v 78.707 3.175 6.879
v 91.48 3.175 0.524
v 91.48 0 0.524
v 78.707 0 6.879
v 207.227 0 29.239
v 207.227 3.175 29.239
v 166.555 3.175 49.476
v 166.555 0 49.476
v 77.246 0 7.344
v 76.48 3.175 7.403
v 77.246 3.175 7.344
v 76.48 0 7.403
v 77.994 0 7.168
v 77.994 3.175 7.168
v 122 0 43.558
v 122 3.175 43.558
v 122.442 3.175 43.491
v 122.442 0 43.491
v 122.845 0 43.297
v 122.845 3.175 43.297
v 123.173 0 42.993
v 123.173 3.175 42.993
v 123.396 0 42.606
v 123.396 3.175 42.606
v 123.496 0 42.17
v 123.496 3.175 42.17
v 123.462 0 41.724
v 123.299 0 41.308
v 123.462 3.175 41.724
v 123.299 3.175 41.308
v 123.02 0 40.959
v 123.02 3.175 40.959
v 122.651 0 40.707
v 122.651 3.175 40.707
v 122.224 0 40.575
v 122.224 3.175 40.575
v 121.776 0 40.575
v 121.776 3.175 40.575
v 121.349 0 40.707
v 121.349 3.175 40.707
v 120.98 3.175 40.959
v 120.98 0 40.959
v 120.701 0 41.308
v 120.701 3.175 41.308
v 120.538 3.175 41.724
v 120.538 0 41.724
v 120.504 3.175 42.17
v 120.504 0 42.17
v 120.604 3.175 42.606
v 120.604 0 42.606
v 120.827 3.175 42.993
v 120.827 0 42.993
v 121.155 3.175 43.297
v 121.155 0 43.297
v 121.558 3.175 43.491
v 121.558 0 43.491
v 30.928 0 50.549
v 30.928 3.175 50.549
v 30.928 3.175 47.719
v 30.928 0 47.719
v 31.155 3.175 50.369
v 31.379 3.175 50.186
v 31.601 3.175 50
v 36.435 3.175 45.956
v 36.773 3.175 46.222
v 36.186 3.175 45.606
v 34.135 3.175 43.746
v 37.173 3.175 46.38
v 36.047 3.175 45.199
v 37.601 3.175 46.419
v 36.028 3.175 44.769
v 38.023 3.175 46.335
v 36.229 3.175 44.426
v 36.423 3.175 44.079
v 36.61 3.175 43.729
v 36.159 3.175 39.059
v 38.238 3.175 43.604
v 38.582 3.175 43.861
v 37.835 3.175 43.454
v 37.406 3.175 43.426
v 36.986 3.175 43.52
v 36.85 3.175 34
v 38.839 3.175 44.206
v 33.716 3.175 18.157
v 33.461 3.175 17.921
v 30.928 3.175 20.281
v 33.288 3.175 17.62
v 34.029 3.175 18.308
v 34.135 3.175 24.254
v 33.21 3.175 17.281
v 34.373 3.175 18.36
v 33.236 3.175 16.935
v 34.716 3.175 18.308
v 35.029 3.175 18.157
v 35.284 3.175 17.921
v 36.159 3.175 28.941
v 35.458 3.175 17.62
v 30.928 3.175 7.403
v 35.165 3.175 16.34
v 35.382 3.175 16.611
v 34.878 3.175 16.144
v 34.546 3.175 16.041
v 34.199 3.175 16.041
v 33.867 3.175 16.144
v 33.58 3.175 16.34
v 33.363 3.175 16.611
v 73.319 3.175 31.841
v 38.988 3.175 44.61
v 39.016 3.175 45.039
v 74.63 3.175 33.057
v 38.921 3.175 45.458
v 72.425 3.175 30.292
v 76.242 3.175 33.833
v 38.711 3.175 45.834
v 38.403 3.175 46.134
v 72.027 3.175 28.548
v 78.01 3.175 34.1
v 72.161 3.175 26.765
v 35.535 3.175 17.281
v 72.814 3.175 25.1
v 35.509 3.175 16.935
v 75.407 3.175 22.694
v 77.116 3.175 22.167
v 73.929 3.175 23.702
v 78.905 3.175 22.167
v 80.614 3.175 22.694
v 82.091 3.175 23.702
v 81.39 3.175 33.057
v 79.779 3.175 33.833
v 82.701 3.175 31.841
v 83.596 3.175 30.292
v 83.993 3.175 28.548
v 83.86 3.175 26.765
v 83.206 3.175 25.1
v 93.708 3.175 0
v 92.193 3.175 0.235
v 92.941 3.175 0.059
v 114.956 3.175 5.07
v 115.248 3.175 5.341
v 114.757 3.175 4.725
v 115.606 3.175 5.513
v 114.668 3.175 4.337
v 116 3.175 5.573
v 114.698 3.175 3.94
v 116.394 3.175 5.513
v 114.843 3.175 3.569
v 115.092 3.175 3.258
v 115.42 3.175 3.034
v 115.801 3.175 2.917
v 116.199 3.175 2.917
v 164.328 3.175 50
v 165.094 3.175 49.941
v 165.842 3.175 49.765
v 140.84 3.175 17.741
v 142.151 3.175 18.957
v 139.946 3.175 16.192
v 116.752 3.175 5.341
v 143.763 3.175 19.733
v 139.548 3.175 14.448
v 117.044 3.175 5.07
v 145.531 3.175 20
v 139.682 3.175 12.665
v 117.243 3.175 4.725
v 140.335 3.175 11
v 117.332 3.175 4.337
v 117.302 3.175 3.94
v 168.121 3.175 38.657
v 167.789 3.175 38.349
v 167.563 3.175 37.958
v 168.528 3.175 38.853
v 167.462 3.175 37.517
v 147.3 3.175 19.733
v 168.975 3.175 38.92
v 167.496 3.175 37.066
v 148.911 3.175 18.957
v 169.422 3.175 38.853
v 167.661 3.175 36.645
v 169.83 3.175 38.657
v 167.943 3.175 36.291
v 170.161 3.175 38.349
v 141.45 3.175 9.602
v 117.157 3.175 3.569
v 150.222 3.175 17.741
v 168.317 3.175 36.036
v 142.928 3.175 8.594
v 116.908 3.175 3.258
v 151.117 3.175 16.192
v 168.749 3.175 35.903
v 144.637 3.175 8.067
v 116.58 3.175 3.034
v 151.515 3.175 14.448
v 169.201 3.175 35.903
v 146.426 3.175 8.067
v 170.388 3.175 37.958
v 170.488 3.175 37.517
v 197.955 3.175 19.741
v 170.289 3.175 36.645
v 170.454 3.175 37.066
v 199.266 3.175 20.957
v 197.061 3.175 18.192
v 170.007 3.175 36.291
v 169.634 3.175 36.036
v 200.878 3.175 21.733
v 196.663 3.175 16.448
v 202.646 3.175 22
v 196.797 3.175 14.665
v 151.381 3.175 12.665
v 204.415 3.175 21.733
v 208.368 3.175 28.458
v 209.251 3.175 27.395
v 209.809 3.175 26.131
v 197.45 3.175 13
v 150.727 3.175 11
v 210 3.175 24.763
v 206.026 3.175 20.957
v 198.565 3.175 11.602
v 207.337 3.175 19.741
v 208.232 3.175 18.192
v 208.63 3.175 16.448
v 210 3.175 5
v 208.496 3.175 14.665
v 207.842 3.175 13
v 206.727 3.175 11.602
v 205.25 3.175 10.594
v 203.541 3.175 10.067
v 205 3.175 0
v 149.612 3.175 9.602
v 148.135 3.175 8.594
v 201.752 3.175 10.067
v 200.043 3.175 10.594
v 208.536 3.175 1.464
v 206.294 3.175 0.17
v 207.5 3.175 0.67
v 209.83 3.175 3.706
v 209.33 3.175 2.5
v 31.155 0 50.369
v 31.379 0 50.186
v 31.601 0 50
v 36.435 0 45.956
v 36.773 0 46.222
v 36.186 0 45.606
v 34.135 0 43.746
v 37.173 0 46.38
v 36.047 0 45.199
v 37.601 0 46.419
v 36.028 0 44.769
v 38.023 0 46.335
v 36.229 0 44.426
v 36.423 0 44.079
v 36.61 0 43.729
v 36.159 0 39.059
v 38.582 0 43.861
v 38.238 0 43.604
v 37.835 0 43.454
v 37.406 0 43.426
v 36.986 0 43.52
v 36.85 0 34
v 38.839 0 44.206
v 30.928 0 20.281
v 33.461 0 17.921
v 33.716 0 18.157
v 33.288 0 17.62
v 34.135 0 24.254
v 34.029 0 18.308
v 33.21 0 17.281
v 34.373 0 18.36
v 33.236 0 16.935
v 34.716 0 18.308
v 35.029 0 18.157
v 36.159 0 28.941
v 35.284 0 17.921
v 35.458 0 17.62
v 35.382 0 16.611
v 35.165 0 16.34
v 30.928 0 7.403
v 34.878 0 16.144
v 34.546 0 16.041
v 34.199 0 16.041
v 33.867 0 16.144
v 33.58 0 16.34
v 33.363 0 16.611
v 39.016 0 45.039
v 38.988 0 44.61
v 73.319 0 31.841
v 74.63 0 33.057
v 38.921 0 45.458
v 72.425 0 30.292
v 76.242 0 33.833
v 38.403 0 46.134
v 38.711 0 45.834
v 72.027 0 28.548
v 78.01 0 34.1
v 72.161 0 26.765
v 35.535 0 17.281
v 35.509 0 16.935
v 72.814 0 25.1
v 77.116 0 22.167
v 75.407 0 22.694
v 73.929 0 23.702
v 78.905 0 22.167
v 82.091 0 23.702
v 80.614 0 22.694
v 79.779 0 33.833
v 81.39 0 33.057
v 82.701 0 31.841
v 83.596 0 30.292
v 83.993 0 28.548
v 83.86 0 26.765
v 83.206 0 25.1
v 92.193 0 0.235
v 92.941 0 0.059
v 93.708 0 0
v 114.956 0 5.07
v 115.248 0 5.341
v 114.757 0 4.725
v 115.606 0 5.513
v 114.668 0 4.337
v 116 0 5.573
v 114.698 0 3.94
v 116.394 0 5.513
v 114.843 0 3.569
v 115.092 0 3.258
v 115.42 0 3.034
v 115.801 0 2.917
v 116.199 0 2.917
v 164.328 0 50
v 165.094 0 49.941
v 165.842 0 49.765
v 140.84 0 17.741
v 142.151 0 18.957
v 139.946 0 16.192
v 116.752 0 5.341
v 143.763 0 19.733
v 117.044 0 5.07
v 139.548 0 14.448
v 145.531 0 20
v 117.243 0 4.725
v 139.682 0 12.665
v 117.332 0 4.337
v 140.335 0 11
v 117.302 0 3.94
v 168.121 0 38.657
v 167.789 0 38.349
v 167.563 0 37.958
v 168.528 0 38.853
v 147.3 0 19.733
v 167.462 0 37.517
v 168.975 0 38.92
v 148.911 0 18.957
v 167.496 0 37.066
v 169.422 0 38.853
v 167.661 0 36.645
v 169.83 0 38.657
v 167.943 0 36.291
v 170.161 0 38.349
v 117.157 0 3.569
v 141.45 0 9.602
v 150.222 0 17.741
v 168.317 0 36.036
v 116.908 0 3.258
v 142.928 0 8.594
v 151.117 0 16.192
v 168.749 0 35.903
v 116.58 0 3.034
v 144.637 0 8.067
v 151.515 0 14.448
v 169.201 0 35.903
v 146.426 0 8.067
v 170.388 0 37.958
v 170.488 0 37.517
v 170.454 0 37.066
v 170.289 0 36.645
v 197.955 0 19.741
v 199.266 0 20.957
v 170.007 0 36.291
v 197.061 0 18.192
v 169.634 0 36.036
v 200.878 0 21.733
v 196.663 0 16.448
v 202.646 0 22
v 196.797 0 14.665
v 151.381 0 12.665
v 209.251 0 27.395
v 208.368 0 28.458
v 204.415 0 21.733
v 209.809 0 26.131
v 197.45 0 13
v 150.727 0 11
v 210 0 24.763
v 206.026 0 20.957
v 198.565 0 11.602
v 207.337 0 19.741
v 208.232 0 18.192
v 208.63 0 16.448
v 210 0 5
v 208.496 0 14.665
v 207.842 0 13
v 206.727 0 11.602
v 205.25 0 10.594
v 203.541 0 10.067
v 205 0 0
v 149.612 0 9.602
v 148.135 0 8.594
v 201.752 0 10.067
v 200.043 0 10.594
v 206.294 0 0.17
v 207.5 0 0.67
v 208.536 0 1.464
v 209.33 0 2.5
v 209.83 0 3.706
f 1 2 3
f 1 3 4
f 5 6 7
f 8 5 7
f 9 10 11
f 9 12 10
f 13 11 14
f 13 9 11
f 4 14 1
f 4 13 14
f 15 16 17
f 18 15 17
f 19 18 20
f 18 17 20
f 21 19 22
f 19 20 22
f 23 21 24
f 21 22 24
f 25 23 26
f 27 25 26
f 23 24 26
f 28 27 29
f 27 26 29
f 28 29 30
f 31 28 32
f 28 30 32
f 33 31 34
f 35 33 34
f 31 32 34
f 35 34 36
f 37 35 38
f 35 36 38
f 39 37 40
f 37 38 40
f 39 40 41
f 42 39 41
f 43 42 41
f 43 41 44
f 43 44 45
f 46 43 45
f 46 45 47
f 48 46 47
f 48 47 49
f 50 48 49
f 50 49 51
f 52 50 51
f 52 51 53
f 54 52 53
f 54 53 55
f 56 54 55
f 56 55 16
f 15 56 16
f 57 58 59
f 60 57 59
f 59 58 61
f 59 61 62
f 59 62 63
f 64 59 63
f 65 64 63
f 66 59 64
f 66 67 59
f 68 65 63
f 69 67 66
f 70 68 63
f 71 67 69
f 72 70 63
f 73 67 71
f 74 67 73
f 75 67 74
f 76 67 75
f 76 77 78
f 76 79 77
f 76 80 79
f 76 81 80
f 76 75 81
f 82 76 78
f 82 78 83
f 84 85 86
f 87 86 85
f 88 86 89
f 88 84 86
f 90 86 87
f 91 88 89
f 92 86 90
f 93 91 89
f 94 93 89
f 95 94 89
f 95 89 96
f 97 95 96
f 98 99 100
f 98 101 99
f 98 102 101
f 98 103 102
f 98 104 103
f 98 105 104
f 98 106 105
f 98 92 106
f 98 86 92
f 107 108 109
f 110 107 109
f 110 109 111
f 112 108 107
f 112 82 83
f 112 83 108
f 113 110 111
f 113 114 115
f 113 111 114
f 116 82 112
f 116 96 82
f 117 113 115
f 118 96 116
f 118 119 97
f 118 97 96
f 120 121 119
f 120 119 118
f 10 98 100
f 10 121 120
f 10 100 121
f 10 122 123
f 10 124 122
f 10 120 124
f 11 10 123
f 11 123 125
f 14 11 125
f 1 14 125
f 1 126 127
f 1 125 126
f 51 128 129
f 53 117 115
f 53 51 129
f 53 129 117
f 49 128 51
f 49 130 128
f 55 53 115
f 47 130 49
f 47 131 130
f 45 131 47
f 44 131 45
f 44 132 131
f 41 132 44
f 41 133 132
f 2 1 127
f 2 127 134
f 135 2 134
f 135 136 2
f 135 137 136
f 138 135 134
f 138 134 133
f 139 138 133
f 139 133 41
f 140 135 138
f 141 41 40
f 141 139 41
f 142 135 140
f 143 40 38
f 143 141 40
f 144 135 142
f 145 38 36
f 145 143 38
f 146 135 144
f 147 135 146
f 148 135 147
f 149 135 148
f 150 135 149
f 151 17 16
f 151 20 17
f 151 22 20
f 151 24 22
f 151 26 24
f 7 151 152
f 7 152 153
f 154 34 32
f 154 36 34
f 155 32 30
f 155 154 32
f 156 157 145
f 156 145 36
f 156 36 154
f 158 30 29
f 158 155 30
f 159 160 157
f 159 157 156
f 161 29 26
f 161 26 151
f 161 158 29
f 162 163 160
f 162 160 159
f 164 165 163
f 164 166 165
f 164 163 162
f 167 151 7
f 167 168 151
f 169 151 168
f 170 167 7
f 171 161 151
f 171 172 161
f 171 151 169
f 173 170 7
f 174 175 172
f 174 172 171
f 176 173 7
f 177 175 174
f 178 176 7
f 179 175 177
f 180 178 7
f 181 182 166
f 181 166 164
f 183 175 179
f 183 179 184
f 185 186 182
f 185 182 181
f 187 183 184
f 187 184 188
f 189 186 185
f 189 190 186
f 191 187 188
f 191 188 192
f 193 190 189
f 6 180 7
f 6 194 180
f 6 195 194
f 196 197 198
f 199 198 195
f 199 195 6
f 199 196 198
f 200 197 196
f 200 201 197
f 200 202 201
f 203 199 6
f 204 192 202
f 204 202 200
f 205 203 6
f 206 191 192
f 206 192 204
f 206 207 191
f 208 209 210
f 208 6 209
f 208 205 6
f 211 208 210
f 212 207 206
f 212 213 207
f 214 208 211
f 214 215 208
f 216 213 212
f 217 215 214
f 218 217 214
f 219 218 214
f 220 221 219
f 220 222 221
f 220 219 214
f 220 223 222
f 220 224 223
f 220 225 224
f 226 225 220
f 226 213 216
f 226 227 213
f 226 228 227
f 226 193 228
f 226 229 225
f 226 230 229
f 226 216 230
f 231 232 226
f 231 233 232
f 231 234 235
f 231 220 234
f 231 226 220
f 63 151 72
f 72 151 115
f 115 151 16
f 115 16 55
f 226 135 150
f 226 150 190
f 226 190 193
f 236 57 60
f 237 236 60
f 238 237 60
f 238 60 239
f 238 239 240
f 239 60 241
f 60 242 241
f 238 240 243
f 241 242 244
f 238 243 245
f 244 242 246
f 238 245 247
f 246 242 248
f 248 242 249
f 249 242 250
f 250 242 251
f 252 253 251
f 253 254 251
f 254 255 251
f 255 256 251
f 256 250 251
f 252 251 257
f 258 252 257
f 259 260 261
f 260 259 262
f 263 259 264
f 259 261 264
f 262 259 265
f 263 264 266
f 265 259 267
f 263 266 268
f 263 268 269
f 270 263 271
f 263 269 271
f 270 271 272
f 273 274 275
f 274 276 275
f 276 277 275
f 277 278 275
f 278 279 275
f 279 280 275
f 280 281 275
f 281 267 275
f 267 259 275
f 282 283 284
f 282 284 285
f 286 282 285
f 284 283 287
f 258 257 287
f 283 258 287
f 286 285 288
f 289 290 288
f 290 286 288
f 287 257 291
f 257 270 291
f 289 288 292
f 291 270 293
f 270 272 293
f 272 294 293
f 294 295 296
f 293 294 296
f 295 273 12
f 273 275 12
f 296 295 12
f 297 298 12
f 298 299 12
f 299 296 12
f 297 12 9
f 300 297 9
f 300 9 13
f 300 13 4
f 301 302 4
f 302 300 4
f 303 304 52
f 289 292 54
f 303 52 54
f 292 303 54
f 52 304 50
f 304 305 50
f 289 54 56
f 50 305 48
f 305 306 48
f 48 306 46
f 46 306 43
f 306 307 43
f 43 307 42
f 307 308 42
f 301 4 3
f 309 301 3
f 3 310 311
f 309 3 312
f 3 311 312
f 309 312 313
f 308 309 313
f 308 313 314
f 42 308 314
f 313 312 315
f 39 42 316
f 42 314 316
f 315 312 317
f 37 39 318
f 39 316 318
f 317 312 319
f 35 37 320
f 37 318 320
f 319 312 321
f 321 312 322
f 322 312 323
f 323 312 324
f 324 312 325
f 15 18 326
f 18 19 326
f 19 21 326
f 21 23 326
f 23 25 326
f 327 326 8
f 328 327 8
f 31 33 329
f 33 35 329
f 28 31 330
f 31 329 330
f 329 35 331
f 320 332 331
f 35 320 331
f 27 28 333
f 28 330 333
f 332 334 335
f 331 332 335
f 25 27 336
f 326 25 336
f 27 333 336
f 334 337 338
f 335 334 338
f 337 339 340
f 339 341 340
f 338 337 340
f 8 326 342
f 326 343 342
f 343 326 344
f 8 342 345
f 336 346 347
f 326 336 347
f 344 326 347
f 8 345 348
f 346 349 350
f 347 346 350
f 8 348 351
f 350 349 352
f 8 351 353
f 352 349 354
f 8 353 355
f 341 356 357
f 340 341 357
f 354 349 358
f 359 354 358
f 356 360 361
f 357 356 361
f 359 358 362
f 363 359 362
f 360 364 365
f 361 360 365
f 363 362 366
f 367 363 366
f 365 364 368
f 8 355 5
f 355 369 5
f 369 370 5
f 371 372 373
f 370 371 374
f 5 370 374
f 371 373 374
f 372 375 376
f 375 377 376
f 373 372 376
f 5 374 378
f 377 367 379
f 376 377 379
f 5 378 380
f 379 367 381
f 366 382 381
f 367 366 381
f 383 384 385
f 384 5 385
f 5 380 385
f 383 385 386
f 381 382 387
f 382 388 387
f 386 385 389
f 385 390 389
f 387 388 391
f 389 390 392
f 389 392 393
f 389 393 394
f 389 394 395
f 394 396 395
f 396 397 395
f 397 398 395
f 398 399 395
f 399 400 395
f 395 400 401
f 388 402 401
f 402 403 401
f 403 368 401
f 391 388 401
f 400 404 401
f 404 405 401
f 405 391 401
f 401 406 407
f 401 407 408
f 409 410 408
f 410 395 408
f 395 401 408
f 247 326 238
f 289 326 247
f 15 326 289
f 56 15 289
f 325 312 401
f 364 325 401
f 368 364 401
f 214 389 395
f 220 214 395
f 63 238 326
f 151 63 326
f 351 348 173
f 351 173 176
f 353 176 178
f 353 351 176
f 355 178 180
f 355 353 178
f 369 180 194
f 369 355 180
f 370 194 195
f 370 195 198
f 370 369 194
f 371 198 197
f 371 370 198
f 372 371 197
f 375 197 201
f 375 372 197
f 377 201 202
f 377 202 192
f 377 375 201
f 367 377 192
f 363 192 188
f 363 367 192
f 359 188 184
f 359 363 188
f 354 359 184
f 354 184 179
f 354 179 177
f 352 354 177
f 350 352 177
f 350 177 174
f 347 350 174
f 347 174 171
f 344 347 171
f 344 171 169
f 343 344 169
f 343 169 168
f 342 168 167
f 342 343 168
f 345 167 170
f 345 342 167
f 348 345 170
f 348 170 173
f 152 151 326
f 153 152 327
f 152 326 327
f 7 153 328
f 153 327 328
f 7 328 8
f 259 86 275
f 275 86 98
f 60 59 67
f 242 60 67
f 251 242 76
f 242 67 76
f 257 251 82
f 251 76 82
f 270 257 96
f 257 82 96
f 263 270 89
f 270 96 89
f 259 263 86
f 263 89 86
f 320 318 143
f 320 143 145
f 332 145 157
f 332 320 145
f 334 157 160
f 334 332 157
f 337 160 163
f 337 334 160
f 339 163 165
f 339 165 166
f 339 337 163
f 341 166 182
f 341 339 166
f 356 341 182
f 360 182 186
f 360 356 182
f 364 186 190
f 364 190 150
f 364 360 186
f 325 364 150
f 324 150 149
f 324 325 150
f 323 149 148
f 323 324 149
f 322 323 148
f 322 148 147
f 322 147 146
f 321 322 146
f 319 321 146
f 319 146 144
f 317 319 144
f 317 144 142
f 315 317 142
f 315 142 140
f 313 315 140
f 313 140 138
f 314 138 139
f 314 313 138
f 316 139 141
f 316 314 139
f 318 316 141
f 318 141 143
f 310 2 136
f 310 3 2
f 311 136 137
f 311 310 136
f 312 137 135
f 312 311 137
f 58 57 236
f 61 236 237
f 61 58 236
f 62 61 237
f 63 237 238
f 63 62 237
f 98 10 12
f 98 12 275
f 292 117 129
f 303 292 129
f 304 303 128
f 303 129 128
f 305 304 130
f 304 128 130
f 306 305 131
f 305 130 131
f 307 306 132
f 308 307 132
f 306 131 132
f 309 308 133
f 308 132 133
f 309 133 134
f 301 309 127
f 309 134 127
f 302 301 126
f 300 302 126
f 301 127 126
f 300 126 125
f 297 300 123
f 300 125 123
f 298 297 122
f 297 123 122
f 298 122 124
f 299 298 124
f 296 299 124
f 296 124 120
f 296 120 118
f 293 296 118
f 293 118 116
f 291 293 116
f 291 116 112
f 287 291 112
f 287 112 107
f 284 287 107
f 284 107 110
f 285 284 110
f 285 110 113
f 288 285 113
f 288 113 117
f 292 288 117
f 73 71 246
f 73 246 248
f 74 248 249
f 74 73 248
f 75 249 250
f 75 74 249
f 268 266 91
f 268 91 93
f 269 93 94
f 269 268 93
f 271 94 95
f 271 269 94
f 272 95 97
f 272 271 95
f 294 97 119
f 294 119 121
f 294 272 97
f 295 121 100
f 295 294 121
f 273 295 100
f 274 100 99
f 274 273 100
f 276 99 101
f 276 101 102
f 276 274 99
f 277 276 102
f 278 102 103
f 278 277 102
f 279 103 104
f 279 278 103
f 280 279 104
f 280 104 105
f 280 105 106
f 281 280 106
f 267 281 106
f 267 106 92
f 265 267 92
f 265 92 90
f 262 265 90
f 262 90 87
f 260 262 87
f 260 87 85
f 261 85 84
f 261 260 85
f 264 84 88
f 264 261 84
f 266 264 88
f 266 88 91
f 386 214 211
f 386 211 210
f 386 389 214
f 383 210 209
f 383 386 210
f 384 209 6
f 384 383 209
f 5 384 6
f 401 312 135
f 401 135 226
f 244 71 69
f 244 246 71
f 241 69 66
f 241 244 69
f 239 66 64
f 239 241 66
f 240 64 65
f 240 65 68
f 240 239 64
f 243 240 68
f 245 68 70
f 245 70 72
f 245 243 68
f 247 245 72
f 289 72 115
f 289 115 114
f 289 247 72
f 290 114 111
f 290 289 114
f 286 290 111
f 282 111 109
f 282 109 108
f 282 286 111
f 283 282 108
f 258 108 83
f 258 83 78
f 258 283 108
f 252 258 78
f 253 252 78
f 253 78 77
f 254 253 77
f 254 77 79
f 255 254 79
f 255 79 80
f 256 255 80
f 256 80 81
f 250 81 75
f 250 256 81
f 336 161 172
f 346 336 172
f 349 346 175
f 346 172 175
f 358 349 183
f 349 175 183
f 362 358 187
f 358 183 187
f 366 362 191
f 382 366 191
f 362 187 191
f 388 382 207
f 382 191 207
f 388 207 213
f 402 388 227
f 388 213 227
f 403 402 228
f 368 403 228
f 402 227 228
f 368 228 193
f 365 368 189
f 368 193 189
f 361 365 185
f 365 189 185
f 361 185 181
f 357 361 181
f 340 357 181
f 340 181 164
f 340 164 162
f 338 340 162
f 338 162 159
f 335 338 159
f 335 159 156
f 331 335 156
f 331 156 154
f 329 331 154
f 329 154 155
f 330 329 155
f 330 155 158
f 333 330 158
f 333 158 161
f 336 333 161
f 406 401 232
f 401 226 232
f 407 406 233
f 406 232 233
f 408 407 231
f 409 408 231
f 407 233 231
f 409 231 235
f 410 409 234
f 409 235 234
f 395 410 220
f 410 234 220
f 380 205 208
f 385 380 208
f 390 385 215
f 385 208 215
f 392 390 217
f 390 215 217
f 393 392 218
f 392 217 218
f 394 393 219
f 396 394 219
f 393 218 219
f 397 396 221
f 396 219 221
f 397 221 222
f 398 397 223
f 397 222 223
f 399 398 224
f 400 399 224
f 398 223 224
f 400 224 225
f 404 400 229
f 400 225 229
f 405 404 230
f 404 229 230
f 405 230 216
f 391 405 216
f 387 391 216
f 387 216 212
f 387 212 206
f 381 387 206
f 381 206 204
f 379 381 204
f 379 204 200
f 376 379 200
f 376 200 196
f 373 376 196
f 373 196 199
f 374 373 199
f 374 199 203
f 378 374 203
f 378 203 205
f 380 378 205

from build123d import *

# Parameters (mm, degrees)
SKETCH1_W           = 210
SKETCH1_H           = 50
SKETCH1_R           = 1.211665018
SKETCH1_R_2         = 1.165617118
SKETCH1_R_3         = 1.5
SKETCH1_R_4         = 1.517273905
SKETCH1_R_5         = 1.335614121
SKETCH1_R_6         = 1.62438417
BOSS_EXTRUDE1_DEPTH = 3.175
SKETCH2_R           = 2
CUT_EXTRUDE1_DEPTH  = 10
SKETCH3_R           = 6
SKETCH3_R_2         = 0.586995366
CUT_EXTRUDE2_DEPTH  = 57.15
CUT_EXTRUDE7_DEPTH  = 10
FILLET3_R           = 5
SKETCH11_R          = 18.5
SKETCH11_R_2        = 2
BOSS_EXTRUDE4_DEPTH = 3.175
SKETCH12_R          = 21
BOSS_EXTRUDE5_DEPTH = 3.175
SKETCH13_R          = 18.85
CUT_EXTRUDE8_DEPTH  = 3.175
BOSS_EXTRUDE6_DEPTH = 3.175
FILLET4_R           = 5
SKETCH15_R          = 1.5
CUT_EXTRUDE9_DEPTH  = 10
SKETCH16_R          = 1.5
CUT_EXTRUDE10_DEPTH = 10
SKETCH17_W          = 82.811100577
SKETCH17_H          = 66.522656387
CUT_EXTRUDE11_DEPTH = 10


with BuildPart() as part:
    # Sketch1 → Boss-Extrude1 (new body)
    with BuildSketch(Plane(origin=(0, 0, 0), x_dir=(1, 0, 0), z_dir=(0, 1, 0))):
        with Locations((105, -25)):
            Rectangle(SKETCH1_W, SKETCH1_H)
        with Locations(Location((3.489526233, -16.787661112, 0), (0, 0, 270))):
            Circle(SKETCH1_R, mode=Mode.SUBTRACT)
        with Locations(Location((34.37258772, -17.194005245, 0), (0, 0, 270))):
            Circle(SKETCH1_R_2, mode=Mode.SUBTRACT)
        with Locations(Location((37.520749958, -44.921198121, 0), (0, 0, 270))):
            Circle(SKETCH1_R_3, mode=Mode.SUBTRACT)
        with Locations(Location((168.975233936, -37.403209633, 0), (0, 0, 270))):
            Circle(SKETCH1_R_4, mode=Mode.SUBTRACT)
        with Locations(Location((116, -4.237214774, 0), (0, 0, 270))):
            Circle(SKETCH1_R_5, mode=Mode.SUBTRACT)
        with Locations(Location((12.257640281, -3.274812063, 0), (0, 0, 270))):
            Circle(SKETCH1_R_6, mode=Mode.SUBTRACT)
    extrude(amount=BOSS_EXTRUDE1_DEPTH)

    # Sketch2 → Cut-Extrude1 (cut)
    with BuildSketch(Plane(origin=(0, 3.175, 0), x_dir=(1, 0, 0), z_dir=(0, 1, 0))):
        with Locations(Location((10, -26, 0), (0, 0, 270))):
            Circle(SKETCH2_R)
        with Locations(Location((10, -42, 0), (0, 0, 270))):
            Circle(SKETCH2_R)
        with Locations(Location((26, -26, 0), (0, 0, 270))):
            Circle(SKETCH2_R)
        with Locations(Location((26, -42, 0), (0, 0, 270))):
            Circle(SKETCH2_R)
    extrude(amount=-CUT_EXTRUDE1_DEPTH, mode=Mode.SUBTRACT)

    # Sketch3 → Cut-Extrude2 (cut)
    with BuildSketch(Plane(origin=(0, 3.175, 0), x_dir=(1, 0, 0), z_dir=(0, 1, 0))):
        with Locations(Location((78.01026379, -28.1, 0), (0, 0, 270))):
            Circle(SKETCH3_R)
        with Locations(Location((145.531297368, -14, 0), (0, 0, 270))):
            Circle(SKETCH3_R)
        with Locations(Location((18, -34, 0), (0, 0, 270))):
            Circle(SKETCH3_R_2)
        with Locations(Location((202.646291021, -16, 0), (0, 0, 270))):
            Circle(SKETCH3_R)
    extrude(amount=-CUT_EXTRUDE2_DEPTH, mode=Mode.SUBTRACT)

    # Sketch10 → Cut-Extrude7 (cut)
    with BuildSketch(Plane(origin=(0, 3.175, 0), x_dir=(1, 0, 0), z_dir=(0, 1, 0))):
        Polygon((210, -27.859435908), (165.502877994, -50), (210, -50), align=None)
        Polygon((92.532613397, 0), (77.65477062, -7.402812063), (0, -7.402812063), (0, 0), align=None)
    extrude(amount=-CUT_EXTRUDE7_DEPTH, mode=Mode.SUBTRACT)

    # Fillet3
    fillet3_edges = [part.edges().sort_by_distance(p)[0] for p in [
        (210, 1.5875, 0),
        (0, 1.5875, 50),
        (92.532613397, 1.5875, 0),
        (210, 1.5875, 27.859435908),
        (165.502877994, 1.5875, 50),
        (77.65477062, 1.5875, 7.402812063),
        (0, 1.5875, 7.402812063),
    ]]
    fillet(fillet3_edges, radius=FILLET3_R)

    # Sketch11 → Boss-Extrude4 (add)
    with BuildSketch(Plane(origin=(0, 3.175, 0), x_dir=(1, 0, 0), z_dir=(0, 1, 0))):
        with Locations((18, -34)):
            Circle(SKETCH11_R)
        with Locations(Location((10, -26, 0), (0, 0, 270))):
            Circle(SKETCH11_R_2, mode=Mode.SUBTRACT)
        with Locations(Location((10, -42, 0), (0, 0, 270))):
            Circle(SKETCH11_R_2, mode=Mode.SUBTRACT)
        with Locations(Location((26, -26, 0), (0, 0, 270))):
            Circle(SKETCH11_R_2, mode=Mode.SUBTRACT)
        with Locations(Location((26, -42, 0), (0, 0, 270))):
            Circle(SKETCH11_R_2, mode=Mode.SUBTRACT)
    extrude(amount=-BOSS_EXTRUDE4_DEPTH)

    # Sketch12 → Boss-Extrude5 (add)
    with BuildSketch(Plane(origin=(0, 3.175, 0), x_dir=(1, 0, 0), z_dir=(0, 1, 0))):
        with Locations((18, -34)):
            Circle(SKETCH12_R)
    extrude(amount=-BOSS_EXTRUDE5_DEPTH)

    # Sketch13 → Cut-Extrude8 (cut)
    with BuildSketch(Plane(origin=(0, 3.175, 0), x_dir=(1, 0, 0), z_dir=(0, 1, 0))):
        with Locations(Location((18, -34, 0), (0, 0, 270))):
            Circle(SKETCH13_R)
    extrude(amount=-CUT_EXTRUDE8_DEPTH, mode=Mode.SUBTRACT)

    # Sketch14 → Boss-Extrude6 (add)
    with BuildSketch(Plane(origin=(0, 3.175, 0), x_dir=(1, 0, 0), z_dir=(0, 1, 0))):
        with BuildLine():
            Line((-35.83, -34.272812063), (-2.998227868, -34.272812063))
            ThreePointArc((-2.998227868, -34.272812063), (-2.272136238, -28.519079241), (0, -23.183346174))
            Line((0, -23.183346174), (0, -12.402812063))
            Line((0, -12.402812063), (0, -12.248529085))
            Line((0, -12.248529085), (0, 0.727187937))
            Line((0, 0.727187937), (-35.83, 0.727187937))
            Line((-35.83, 0.727187937), (-35.83, -34.272812063))
        make_face()
        with BuildLine():
            Line((0, 0.727187937), (0, -12.248529085))
            Line((0, -12.248529085), (0.002380891, -12.248529085))
            ThreePointArc((0.002380891, -12.248529085), (1.51944077, -8.813145304), (5, -7.402812063))
            Line((5, -7.402812063), (18, -7.402812063))
            Line((18, -7.402812063), (18, 0.727187937))
            Line((18, 0.727187937), (0, 0.727187937))
        make_face()
    extrude(amount=-BOSS_EXTRUDE6_DEPTH)

    # Fillet4
    fillet4_edges = [part.edges().sort_by_distance(p)[0] for p in [
        (-35.83, 1.5875, 34.272812063),
        (-35.83, 1.5875, -0.727187937),
        (18, 1.5875, -0.727187937),
    ]]
    fillet(fillet4_edges, radius=FILLET4_R)

    # Sketch15 → Cut-Extrude9 (cut)
    with BuildSketch(Plane(origin=(0, 3.175, 0), x_dir=(1, 0, 0), z_dir=(0, 1, 0))):
        with Locations(Location((122, -42.058139805, 0), (0, 0, 270))):
            Circle(SKETCH15_R)
    extrude(amount=-CUT_EXTRUDE9_DEPTH, mode=Mode.SUBTRACT)

    # Sketch16 → Cut-Extrude10 (cut)
    with BuildSketch(Plane(origin=(0, 3.175, 0), x_dir=(1, 0, 0), z_dir=(0, 1, 0))):
        with Locations(Location((12, -3.272812063, 0), (0, 0, 270))):
            Circle(SKETCH16_R)
    extrude(amount=-CUT_EXTRUDE10_DEPTH, mode=Mode.SUBTRACT)

    # Sketch17 → Cut-Extrude11 (cut)
    with BuildSketch(Plane(origin=(0, 3.175, 0), x_dir=(1, 0, 0), z_dir=(0, 1, 0))):
        with Locations((-10.47799366, -23.384449303)):
            Rectangle(SKETCH17_W, SKETCH17_H)
    extrude(amount=-CUT_EXTRUDE11_DEPTH, mode=Mode.SUBTRACT)


solid = part.part
